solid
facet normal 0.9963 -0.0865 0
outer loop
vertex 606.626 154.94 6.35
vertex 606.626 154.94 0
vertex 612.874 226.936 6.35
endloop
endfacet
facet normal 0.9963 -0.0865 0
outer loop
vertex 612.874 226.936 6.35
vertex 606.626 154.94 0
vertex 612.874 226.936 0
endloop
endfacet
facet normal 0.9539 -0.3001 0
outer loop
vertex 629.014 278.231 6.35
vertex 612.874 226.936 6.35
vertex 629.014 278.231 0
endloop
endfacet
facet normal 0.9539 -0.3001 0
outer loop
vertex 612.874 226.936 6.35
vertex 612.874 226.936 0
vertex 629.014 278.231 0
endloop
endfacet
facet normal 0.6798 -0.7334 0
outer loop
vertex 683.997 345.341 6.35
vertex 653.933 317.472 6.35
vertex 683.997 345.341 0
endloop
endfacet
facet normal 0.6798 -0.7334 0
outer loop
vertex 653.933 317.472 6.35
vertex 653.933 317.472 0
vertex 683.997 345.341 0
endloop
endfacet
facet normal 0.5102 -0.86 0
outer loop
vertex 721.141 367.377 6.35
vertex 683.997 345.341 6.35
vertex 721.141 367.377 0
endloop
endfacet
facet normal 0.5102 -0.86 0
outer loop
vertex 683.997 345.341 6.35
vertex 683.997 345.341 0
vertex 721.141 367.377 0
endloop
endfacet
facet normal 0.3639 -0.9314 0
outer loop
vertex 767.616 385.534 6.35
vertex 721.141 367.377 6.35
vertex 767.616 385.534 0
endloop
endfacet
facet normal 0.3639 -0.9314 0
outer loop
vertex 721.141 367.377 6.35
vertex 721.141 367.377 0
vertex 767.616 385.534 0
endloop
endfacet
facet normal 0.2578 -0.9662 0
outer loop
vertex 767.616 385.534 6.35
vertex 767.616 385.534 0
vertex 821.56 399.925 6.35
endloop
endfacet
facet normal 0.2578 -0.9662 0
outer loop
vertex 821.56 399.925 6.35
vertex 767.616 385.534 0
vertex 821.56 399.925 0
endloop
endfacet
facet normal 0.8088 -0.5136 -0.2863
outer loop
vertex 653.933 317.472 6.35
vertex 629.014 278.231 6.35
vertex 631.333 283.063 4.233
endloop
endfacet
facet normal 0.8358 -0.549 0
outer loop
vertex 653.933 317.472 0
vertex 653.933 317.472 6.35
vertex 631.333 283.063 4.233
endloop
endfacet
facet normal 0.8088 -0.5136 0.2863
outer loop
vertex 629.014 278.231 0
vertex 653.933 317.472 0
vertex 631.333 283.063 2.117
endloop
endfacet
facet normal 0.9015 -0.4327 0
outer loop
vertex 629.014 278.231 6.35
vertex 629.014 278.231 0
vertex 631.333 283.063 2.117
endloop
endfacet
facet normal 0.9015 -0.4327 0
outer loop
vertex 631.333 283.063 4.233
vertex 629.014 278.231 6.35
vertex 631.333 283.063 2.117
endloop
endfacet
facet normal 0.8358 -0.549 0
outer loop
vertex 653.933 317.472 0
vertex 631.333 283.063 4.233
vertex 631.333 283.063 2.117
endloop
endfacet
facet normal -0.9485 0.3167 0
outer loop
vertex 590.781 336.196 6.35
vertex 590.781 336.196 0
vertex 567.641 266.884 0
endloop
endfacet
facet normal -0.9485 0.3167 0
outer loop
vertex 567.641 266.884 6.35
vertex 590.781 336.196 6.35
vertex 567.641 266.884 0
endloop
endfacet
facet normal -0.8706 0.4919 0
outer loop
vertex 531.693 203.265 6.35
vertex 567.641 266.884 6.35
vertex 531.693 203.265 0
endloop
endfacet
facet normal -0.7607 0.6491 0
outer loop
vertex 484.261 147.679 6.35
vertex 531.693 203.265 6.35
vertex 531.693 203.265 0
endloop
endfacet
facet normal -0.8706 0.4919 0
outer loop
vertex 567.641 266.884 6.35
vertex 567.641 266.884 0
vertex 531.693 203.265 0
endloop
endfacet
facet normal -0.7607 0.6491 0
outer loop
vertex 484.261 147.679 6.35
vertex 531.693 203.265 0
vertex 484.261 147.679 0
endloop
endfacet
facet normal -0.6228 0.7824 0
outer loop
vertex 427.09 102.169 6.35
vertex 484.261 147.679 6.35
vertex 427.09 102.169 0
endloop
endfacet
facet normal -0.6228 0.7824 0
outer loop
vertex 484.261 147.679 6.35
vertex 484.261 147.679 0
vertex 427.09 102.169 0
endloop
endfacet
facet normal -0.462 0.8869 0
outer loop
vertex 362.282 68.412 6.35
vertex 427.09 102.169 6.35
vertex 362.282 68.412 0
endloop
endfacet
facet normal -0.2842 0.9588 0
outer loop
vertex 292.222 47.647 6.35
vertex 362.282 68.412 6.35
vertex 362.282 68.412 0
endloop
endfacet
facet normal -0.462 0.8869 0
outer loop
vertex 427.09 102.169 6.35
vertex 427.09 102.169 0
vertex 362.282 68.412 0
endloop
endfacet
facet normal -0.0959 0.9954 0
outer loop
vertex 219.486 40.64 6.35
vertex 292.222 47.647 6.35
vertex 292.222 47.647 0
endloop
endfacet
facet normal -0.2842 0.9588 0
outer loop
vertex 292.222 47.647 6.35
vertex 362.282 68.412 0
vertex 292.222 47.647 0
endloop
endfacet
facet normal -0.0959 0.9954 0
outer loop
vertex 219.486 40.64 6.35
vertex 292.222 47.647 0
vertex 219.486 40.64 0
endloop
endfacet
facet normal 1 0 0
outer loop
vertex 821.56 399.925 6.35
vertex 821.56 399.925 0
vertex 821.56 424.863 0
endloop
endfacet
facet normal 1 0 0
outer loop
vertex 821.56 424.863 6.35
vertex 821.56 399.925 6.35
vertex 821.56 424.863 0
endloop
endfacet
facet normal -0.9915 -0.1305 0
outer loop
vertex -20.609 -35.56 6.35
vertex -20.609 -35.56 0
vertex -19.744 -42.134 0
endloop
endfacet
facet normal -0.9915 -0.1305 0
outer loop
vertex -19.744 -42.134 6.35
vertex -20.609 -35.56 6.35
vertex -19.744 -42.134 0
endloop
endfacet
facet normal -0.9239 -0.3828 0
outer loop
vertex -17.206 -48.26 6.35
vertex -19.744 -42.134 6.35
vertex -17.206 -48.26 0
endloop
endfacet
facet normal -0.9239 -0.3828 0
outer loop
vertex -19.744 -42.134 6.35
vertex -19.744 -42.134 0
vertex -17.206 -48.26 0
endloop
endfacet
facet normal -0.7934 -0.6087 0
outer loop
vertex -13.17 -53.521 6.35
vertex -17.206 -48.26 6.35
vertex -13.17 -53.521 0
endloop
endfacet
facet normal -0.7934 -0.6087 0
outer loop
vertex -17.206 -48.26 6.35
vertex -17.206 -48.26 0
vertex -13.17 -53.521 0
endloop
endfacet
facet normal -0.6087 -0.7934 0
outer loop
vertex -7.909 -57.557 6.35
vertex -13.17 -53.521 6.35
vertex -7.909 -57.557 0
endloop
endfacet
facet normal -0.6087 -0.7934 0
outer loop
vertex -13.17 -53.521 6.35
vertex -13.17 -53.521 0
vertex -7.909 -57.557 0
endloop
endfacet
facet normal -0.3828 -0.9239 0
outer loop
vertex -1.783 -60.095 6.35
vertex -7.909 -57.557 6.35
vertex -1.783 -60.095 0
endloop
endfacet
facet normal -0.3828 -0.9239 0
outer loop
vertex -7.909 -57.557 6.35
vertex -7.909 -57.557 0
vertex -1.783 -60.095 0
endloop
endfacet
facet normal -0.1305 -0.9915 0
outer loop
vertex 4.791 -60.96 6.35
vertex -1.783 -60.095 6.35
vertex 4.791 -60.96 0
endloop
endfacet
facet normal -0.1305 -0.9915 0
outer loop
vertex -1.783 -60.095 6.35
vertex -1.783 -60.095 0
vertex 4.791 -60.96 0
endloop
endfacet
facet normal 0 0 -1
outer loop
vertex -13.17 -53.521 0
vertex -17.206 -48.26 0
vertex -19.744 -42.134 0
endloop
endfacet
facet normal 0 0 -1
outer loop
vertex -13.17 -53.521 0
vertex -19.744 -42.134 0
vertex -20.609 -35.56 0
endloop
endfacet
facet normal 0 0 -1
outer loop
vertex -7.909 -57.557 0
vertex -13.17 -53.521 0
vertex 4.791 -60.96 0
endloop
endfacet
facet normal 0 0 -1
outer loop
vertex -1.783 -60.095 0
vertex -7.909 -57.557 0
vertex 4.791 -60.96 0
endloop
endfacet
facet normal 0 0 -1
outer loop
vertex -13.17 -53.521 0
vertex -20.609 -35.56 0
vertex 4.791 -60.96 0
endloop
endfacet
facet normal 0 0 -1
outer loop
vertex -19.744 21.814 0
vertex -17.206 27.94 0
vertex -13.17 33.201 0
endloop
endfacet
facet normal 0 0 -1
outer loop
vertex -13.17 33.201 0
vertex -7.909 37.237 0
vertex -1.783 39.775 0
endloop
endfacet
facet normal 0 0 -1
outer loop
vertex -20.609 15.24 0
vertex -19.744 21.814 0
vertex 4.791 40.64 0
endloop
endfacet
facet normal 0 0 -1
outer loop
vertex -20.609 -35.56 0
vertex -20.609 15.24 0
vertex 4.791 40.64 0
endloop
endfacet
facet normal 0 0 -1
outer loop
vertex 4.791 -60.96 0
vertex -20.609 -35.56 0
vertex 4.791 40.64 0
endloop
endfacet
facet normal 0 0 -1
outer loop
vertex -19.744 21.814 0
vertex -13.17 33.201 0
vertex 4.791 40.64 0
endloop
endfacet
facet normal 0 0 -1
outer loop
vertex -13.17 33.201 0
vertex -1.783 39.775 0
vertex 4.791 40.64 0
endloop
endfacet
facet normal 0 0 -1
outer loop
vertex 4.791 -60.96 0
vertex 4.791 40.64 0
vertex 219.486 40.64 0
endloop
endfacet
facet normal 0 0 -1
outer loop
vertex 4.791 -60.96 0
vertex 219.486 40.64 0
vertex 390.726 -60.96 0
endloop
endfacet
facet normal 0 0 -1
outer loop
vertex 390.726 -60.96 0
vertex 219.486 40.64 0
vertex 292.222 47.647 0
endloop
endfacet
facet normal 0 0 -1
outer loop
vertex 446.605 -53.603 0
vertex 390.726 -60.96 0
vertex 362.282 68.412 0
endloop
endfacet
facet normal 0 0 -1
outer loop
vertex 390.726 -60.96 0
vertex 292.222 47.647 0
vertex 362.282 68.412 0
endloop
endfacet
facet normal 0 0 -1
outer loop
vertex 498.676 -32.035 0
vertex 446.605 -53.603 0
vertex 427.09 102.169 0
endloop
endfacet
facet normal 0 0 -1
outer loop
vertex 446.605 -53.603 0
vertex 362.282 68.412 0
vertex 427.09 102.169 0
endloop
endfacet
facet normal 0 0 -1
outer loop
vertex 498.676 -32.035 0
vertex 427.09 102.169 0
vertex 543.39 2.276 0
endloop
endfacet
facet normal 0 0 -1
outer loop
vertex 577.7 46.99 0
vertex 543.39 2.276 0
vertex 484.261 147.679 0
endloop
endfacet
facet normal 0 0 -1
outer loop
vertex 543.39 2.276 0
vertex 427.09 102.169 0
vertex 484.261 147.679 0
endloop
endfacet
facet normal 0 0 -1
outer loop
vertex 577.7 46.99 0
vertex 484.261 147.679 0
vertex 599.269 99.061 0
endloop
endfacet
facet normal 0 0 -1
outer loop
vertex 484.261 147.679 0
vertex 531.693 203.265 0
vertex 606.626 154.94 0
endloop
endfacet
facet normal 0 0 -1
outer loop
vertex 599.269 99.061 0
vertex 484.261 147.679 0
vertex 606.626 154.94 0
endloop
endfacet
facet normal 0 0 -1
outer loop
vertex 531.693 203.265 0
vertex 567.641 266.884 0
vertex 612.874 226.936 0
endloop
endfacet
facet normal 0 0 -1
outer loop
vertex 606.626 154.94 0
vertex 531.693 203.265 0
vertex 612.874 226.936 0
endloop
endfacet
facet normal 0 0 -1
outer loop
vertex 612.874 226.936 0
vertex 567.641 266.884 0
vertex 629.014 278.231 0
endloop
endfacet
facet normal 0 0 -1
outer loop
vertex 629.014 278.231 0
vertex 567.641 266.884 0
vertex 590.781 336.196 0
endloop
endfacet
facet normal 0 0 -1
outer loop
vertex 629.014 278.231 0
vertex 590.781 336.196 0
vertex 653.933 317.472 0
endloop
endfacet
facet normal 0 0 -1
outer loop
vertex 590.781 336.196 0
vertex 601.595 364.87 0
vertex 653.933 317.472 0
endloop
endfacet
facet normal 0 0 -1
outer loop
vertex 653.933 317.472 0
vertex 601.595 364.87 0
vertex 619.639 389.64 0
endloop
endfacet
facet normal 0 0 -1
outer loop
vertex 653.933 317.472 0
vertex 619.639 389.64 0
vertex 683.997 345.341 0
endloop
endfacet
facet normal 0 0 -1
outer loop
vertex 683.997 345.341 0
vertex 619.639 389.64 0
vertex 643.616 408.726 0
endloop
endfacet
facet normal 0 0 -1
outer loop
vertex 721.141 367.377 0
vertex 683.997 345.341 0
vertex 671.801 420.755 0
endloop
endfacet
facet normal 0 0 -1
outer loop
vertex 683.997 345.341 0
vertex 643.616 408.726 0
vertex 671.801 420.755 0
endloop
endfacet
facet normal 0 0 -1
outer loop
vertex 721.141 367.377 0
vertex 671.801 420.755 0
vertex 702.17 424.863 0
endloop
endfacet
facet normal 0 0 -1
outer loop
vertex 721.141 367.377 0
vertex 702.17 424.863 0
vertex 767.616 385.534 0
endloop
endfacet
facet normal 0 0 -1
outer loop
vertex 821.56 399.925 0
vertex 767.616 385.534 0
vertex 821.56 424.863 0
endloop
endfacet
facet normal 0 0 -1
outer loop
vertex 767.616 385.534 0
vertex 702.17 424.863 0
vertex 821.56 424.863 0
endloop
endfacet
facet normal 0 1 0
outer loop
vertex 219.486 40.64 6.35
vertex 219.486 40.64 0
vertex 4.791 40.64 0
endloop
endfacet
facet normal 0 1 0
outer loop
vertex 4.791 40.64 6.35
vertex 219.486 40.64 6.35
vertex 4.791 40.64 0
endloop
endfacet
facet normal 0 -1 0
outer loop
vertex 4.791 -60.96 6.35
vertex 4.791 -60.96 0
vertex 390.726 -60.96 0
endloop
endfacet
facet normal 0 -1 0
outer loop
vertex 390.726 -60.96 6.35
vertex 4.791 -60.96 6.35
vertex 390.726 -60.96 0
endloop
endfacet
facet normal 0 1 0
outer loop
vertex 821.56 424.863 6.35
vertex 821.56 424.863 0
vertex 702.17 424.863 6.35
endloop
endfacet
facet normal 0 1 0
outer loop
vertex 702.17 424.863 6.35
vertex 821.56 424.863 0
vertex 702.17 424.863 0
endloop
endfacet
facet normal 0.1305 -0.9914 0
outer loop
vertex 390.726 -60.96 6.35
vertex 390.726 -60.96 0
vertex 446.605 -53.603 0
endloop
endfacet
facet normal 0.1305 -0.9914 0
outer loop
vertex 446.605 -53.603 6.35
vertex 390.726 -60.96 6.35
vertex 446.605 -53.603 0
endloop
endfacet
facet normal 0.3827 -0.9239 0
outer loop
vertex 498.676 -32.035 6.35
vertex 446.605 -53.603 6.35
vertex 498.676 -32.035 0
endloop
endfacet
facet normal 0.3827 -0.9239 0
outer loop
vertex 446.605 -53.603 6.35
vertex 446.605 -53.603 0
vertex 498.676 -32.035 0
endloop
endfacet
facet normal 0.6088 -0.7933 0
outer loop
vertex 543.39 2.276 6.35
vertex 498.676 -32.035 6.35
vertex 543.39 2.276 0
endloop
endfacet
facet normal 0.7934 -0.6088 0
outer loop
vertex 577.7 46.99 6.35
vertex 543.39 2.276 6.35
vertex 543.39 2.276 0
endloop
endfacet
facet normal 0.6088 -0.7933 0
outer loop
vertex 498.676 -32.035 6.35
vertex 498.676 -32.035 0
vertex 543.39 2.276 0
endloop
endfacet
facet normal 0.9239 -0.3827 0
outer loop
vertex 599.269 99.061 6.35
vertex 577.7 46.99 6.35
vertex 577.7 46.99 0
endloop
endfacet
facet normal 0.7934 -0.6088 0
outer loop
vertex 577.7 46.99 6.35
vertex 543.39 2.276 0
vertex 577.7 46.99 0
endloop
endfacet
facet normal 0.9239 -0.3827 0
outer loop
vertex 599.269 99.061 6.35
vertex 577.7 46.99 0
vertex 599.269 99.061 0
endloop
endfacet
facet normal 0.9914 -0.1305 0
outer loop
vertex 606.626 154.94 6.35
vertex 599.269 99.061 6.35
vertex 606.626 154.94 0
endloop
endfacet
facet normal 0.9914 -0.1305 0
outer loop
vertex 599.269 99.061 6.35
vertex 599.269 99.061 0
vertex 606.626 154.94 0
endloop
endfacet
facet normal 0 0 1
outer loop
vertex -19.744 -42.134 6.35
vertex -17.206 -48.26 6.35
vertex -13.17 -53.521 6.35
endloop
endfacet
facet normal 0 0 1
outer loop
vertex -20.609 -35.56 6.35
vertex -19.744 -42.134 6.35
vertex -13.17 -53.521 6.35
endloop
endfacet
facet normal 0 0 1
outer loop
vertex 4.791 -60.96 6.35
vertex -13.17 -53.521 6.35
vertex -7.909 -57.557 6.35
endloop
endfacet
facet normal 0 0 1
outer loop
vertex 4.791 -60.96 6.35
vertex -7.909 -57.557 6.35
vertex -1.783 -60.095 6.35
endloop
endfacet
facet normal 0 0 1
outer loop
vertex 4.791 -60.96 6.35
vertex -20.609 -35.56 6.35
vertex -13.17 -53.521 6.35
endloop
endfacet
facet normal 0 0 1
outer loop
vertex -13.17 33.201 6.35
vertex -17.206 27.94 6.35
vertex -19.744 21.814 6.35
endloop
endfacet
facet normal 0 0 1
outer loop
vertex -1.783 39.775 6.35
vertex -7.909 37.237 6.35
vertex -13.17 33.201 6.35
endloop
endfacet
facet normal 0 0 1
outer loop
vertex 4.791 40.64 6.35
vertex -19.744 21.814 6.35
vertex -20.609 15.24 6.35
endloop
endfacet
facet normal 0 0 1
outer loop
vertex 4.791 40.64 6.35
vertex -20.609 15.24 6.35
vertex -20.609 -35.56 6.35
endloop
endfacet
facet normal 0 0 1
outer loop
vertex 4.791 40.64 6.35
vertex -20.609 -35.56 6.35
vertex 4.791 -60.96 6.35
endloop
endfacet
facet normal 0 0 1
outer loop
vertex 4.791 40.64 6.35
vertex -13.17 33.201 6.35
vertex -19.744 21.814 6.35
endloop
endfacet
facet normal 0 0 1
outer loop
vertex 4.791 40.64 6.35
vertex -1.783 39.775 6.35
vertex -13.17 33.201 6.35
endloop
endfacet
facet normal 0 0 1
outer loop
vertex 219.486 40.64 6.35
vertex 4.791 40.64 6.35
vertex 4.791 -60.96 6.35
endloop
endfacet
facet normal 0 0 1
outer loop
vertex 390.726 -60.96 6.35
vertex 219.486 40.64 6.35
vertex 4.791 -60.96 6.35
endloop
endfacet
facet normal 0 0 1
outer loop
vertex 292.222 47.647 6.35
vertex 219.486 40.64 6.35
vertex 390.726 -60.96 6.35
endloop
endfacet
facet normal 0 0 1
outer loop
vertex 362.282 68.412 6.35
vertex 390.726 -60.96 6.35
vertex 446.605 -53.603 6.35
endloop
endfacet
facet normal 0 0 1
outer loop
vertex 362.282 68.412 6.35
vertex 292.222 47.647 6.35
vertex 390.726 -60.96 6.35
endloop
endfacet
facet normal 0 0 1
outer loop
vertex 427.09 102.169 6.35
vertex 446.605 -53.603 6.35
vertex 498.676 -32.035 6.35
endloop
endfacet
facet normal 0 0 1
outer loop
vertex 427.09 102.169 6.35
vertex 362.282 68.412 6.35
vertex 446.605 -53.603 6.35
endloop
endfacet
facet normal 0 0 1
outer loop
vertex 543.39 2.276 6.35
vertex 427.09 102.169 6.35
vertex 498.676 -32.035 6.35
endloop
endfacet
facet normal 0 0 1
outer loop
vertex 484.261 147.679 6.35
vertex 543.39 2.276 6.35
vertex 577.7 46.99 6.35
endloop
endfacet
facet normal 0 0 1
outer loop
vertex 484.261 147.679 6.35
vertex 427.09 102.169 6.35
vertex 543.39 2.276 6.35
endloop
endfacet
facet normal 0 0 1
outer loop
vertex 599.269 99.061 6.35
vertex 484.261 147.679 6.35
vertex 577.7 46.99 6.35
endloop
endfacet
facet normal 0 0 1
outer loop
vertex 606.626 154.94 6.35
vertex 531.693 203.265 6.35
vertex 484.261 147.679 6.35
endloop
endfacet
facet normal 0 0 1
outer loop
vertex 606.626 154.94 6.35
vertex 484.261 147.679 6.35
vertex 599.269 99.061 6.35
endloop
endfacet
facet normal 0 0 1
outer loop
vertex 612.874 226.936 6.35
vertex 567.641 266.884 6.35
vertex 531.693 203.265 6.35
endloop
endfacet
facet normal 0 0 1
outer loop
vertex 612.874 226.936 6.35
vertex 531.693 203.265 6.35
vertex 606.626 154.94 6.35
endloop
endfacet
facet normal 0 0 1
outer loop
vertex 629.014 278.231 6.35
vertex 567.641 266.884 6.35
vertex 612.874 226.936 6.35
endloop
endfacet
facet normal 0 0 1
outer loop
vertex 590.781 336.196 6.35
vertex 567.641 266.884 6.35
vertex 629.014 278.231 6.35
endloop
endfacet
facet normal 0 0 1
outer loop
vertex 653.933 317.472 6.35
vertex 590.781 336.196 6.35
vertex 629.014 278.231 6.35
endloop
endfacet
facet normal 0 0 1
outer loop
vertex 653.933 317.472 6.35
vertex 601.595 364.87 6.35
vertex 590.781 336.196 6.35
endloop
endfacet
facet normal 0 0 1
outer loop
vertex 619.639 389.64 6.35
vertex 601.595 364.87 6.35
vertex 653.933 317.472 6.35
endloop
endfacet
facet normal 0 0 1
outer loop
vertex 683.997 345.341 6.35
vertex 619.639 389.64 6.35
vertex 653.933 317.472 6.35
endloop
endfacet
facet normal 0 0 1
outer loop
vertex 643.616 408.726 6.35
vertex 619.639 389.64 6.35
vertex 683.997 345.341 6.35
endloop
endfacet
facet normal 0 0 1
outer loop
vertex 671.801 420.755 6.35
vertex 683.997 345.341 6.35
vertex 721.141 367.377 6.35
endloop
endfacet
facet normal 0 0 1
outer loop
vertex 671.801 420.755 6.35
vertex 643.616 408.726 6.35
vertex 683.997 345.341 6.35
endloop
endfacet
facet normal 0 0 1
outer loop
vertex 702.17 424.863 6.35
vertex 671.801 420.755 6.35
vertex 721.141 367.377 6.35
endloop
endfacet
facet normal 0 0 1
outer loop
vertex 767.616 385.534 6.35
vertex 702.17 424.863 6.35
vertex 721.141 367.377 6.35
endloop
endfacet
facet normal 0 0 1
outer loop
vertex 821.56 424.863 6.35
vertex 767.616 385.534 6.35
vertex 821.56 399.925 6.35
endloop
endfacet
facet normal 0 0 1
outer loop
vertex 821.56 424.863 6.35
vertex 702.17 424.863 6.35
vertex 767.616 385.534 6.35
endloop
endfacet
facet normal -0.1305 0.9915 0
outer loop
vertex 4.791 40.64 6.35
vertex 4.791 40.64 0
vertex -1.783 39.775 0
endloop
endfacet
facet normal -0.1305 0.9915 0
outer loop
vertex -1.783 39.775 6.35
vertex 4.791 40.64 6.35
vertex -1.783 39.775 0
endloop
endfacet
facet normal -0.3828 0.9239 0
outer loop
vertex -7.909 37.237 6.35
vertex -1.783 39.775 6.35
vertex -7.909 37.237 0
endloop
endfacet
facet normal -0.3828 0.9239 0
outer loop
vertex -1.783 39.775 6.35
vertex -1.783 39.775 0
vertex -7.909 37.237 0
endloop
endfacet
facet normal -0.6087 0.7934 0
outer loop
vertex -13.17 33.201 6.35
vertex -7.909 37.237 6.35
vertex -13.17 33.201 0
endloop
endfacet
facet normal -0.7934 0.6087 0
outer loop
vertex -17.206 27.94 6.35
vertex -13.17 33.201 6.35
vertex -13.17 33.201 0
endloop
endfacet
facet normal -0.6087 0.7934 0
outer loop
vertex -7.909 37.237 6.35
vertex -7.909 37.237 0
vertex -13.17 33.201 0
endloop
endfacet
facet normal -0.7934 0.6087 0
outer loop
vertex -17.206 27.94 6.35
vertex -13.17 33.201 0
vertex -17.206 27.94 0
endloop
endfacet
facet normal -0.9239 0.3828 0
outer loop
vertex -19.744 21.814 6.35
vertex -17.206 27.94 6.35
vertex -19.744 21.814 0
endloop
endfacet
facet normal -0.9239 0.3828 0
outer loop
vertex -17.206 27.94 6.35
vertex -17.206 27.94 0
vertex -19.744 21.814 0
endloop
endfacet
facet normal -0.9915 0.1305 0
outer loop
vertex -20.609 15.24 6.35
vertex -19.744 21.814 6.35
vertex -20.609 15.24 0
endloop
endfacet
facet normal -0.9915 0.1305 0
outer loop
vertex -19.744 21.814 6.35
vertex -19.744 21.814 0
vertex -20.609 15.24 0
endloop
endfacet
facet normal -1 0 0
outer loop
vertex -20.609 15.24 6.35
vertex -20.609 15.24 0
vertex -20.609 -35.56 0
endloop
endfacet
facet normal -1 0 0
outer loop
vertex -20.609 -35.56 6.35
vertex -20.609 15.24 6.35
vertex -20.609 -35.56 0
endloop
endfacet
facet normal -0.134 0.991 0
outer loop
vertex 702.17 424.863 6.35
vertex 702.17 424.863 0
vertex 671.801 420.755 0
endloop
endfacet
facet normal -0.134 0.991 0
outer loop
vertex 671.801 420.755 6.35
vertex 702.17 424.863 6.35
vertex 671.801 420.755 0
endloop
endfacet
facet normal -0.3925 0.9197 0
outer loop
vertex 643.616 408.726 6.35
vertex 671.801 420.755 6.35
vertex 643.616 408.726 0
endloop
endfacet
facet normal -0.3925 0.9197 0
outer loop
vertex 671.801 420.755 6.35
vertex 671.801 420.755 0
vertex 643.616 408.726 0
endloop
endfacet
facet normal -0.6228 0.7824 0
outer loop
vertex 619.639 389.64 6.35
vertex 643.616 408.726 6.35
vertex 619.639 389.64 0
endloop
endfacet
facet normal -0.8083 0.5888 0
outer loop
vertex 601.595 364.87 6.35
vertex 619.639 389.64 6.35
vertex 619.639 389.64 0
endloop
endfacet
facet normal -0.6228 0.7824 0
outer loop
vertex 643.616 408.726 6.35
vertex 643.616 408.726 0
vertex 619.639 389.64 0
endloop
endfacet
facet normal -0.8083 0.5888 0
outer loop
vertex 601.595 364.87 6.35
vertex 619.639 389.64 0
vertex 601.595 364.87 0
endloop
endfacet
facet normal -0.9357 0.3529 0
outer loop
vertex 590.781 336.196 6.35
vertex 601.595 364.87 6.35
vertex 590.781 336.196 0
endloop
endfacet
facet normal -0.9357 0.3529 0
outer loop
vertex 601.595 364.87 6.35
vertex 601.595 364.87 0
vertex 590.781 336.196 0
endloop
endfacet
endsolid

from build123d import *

# Parameters (mm, degrees)
BOSS_EXTRUDE1_DEPTH = 6.35


with BuildPart() as part:
    # Sketch1 → Boss-Extrude1 (new body)
    with BuildSketch(Plane.XY):
        with BuildLine():
            Line((4.79079833, -60.96), (390.725573839, -60.96))
            ThreePointArc((390.725573839, -60.96), (543.389927897, 2.275645942), (606.625573839, 154.94))
            add(Edge.make_bspline(
                [(606.625573839, 154.94), (606.625573839, 316.01001421), (681.985382087, 368.523685091), (821.560436263, 399.924928327)],
                knots=[0, 0, 0, 0, 1, 1, 1, 1], degree=3))
            Line((821.560436263, 399.924928327), (821.560436263, 424.863249898))
            Line((821.560436263, 424.863249898), (702.170074113, 424.863249898))
            ThreePointArc((702.170074113, 424.863249898), (630.985008591, 399.990183462), (590.781410505, 336.196346076))
            ThreePointArc((590.781410505, 336.196346076), (456.769416888, 123.550221456), (219.485865145, 40.64))
            Line((219.485865145, 40.64), (4.79079833, 40.64))
            ThreePointArc((4.79079833, 40.64), (-13.169713912, 33.200512242), (-20.60920167, 15.24))
            Line((-20.60920167, 15.24), (-20.60920167, -35.56))
            ThreePointArc((-20.60920167, -35.56), (-13.169713912, -53.520512242), (4.79079833, -60.96))
        make_face()
    extrude(amount=BOSS_EXTRUDE1_DEPTH)


solid = part.part
